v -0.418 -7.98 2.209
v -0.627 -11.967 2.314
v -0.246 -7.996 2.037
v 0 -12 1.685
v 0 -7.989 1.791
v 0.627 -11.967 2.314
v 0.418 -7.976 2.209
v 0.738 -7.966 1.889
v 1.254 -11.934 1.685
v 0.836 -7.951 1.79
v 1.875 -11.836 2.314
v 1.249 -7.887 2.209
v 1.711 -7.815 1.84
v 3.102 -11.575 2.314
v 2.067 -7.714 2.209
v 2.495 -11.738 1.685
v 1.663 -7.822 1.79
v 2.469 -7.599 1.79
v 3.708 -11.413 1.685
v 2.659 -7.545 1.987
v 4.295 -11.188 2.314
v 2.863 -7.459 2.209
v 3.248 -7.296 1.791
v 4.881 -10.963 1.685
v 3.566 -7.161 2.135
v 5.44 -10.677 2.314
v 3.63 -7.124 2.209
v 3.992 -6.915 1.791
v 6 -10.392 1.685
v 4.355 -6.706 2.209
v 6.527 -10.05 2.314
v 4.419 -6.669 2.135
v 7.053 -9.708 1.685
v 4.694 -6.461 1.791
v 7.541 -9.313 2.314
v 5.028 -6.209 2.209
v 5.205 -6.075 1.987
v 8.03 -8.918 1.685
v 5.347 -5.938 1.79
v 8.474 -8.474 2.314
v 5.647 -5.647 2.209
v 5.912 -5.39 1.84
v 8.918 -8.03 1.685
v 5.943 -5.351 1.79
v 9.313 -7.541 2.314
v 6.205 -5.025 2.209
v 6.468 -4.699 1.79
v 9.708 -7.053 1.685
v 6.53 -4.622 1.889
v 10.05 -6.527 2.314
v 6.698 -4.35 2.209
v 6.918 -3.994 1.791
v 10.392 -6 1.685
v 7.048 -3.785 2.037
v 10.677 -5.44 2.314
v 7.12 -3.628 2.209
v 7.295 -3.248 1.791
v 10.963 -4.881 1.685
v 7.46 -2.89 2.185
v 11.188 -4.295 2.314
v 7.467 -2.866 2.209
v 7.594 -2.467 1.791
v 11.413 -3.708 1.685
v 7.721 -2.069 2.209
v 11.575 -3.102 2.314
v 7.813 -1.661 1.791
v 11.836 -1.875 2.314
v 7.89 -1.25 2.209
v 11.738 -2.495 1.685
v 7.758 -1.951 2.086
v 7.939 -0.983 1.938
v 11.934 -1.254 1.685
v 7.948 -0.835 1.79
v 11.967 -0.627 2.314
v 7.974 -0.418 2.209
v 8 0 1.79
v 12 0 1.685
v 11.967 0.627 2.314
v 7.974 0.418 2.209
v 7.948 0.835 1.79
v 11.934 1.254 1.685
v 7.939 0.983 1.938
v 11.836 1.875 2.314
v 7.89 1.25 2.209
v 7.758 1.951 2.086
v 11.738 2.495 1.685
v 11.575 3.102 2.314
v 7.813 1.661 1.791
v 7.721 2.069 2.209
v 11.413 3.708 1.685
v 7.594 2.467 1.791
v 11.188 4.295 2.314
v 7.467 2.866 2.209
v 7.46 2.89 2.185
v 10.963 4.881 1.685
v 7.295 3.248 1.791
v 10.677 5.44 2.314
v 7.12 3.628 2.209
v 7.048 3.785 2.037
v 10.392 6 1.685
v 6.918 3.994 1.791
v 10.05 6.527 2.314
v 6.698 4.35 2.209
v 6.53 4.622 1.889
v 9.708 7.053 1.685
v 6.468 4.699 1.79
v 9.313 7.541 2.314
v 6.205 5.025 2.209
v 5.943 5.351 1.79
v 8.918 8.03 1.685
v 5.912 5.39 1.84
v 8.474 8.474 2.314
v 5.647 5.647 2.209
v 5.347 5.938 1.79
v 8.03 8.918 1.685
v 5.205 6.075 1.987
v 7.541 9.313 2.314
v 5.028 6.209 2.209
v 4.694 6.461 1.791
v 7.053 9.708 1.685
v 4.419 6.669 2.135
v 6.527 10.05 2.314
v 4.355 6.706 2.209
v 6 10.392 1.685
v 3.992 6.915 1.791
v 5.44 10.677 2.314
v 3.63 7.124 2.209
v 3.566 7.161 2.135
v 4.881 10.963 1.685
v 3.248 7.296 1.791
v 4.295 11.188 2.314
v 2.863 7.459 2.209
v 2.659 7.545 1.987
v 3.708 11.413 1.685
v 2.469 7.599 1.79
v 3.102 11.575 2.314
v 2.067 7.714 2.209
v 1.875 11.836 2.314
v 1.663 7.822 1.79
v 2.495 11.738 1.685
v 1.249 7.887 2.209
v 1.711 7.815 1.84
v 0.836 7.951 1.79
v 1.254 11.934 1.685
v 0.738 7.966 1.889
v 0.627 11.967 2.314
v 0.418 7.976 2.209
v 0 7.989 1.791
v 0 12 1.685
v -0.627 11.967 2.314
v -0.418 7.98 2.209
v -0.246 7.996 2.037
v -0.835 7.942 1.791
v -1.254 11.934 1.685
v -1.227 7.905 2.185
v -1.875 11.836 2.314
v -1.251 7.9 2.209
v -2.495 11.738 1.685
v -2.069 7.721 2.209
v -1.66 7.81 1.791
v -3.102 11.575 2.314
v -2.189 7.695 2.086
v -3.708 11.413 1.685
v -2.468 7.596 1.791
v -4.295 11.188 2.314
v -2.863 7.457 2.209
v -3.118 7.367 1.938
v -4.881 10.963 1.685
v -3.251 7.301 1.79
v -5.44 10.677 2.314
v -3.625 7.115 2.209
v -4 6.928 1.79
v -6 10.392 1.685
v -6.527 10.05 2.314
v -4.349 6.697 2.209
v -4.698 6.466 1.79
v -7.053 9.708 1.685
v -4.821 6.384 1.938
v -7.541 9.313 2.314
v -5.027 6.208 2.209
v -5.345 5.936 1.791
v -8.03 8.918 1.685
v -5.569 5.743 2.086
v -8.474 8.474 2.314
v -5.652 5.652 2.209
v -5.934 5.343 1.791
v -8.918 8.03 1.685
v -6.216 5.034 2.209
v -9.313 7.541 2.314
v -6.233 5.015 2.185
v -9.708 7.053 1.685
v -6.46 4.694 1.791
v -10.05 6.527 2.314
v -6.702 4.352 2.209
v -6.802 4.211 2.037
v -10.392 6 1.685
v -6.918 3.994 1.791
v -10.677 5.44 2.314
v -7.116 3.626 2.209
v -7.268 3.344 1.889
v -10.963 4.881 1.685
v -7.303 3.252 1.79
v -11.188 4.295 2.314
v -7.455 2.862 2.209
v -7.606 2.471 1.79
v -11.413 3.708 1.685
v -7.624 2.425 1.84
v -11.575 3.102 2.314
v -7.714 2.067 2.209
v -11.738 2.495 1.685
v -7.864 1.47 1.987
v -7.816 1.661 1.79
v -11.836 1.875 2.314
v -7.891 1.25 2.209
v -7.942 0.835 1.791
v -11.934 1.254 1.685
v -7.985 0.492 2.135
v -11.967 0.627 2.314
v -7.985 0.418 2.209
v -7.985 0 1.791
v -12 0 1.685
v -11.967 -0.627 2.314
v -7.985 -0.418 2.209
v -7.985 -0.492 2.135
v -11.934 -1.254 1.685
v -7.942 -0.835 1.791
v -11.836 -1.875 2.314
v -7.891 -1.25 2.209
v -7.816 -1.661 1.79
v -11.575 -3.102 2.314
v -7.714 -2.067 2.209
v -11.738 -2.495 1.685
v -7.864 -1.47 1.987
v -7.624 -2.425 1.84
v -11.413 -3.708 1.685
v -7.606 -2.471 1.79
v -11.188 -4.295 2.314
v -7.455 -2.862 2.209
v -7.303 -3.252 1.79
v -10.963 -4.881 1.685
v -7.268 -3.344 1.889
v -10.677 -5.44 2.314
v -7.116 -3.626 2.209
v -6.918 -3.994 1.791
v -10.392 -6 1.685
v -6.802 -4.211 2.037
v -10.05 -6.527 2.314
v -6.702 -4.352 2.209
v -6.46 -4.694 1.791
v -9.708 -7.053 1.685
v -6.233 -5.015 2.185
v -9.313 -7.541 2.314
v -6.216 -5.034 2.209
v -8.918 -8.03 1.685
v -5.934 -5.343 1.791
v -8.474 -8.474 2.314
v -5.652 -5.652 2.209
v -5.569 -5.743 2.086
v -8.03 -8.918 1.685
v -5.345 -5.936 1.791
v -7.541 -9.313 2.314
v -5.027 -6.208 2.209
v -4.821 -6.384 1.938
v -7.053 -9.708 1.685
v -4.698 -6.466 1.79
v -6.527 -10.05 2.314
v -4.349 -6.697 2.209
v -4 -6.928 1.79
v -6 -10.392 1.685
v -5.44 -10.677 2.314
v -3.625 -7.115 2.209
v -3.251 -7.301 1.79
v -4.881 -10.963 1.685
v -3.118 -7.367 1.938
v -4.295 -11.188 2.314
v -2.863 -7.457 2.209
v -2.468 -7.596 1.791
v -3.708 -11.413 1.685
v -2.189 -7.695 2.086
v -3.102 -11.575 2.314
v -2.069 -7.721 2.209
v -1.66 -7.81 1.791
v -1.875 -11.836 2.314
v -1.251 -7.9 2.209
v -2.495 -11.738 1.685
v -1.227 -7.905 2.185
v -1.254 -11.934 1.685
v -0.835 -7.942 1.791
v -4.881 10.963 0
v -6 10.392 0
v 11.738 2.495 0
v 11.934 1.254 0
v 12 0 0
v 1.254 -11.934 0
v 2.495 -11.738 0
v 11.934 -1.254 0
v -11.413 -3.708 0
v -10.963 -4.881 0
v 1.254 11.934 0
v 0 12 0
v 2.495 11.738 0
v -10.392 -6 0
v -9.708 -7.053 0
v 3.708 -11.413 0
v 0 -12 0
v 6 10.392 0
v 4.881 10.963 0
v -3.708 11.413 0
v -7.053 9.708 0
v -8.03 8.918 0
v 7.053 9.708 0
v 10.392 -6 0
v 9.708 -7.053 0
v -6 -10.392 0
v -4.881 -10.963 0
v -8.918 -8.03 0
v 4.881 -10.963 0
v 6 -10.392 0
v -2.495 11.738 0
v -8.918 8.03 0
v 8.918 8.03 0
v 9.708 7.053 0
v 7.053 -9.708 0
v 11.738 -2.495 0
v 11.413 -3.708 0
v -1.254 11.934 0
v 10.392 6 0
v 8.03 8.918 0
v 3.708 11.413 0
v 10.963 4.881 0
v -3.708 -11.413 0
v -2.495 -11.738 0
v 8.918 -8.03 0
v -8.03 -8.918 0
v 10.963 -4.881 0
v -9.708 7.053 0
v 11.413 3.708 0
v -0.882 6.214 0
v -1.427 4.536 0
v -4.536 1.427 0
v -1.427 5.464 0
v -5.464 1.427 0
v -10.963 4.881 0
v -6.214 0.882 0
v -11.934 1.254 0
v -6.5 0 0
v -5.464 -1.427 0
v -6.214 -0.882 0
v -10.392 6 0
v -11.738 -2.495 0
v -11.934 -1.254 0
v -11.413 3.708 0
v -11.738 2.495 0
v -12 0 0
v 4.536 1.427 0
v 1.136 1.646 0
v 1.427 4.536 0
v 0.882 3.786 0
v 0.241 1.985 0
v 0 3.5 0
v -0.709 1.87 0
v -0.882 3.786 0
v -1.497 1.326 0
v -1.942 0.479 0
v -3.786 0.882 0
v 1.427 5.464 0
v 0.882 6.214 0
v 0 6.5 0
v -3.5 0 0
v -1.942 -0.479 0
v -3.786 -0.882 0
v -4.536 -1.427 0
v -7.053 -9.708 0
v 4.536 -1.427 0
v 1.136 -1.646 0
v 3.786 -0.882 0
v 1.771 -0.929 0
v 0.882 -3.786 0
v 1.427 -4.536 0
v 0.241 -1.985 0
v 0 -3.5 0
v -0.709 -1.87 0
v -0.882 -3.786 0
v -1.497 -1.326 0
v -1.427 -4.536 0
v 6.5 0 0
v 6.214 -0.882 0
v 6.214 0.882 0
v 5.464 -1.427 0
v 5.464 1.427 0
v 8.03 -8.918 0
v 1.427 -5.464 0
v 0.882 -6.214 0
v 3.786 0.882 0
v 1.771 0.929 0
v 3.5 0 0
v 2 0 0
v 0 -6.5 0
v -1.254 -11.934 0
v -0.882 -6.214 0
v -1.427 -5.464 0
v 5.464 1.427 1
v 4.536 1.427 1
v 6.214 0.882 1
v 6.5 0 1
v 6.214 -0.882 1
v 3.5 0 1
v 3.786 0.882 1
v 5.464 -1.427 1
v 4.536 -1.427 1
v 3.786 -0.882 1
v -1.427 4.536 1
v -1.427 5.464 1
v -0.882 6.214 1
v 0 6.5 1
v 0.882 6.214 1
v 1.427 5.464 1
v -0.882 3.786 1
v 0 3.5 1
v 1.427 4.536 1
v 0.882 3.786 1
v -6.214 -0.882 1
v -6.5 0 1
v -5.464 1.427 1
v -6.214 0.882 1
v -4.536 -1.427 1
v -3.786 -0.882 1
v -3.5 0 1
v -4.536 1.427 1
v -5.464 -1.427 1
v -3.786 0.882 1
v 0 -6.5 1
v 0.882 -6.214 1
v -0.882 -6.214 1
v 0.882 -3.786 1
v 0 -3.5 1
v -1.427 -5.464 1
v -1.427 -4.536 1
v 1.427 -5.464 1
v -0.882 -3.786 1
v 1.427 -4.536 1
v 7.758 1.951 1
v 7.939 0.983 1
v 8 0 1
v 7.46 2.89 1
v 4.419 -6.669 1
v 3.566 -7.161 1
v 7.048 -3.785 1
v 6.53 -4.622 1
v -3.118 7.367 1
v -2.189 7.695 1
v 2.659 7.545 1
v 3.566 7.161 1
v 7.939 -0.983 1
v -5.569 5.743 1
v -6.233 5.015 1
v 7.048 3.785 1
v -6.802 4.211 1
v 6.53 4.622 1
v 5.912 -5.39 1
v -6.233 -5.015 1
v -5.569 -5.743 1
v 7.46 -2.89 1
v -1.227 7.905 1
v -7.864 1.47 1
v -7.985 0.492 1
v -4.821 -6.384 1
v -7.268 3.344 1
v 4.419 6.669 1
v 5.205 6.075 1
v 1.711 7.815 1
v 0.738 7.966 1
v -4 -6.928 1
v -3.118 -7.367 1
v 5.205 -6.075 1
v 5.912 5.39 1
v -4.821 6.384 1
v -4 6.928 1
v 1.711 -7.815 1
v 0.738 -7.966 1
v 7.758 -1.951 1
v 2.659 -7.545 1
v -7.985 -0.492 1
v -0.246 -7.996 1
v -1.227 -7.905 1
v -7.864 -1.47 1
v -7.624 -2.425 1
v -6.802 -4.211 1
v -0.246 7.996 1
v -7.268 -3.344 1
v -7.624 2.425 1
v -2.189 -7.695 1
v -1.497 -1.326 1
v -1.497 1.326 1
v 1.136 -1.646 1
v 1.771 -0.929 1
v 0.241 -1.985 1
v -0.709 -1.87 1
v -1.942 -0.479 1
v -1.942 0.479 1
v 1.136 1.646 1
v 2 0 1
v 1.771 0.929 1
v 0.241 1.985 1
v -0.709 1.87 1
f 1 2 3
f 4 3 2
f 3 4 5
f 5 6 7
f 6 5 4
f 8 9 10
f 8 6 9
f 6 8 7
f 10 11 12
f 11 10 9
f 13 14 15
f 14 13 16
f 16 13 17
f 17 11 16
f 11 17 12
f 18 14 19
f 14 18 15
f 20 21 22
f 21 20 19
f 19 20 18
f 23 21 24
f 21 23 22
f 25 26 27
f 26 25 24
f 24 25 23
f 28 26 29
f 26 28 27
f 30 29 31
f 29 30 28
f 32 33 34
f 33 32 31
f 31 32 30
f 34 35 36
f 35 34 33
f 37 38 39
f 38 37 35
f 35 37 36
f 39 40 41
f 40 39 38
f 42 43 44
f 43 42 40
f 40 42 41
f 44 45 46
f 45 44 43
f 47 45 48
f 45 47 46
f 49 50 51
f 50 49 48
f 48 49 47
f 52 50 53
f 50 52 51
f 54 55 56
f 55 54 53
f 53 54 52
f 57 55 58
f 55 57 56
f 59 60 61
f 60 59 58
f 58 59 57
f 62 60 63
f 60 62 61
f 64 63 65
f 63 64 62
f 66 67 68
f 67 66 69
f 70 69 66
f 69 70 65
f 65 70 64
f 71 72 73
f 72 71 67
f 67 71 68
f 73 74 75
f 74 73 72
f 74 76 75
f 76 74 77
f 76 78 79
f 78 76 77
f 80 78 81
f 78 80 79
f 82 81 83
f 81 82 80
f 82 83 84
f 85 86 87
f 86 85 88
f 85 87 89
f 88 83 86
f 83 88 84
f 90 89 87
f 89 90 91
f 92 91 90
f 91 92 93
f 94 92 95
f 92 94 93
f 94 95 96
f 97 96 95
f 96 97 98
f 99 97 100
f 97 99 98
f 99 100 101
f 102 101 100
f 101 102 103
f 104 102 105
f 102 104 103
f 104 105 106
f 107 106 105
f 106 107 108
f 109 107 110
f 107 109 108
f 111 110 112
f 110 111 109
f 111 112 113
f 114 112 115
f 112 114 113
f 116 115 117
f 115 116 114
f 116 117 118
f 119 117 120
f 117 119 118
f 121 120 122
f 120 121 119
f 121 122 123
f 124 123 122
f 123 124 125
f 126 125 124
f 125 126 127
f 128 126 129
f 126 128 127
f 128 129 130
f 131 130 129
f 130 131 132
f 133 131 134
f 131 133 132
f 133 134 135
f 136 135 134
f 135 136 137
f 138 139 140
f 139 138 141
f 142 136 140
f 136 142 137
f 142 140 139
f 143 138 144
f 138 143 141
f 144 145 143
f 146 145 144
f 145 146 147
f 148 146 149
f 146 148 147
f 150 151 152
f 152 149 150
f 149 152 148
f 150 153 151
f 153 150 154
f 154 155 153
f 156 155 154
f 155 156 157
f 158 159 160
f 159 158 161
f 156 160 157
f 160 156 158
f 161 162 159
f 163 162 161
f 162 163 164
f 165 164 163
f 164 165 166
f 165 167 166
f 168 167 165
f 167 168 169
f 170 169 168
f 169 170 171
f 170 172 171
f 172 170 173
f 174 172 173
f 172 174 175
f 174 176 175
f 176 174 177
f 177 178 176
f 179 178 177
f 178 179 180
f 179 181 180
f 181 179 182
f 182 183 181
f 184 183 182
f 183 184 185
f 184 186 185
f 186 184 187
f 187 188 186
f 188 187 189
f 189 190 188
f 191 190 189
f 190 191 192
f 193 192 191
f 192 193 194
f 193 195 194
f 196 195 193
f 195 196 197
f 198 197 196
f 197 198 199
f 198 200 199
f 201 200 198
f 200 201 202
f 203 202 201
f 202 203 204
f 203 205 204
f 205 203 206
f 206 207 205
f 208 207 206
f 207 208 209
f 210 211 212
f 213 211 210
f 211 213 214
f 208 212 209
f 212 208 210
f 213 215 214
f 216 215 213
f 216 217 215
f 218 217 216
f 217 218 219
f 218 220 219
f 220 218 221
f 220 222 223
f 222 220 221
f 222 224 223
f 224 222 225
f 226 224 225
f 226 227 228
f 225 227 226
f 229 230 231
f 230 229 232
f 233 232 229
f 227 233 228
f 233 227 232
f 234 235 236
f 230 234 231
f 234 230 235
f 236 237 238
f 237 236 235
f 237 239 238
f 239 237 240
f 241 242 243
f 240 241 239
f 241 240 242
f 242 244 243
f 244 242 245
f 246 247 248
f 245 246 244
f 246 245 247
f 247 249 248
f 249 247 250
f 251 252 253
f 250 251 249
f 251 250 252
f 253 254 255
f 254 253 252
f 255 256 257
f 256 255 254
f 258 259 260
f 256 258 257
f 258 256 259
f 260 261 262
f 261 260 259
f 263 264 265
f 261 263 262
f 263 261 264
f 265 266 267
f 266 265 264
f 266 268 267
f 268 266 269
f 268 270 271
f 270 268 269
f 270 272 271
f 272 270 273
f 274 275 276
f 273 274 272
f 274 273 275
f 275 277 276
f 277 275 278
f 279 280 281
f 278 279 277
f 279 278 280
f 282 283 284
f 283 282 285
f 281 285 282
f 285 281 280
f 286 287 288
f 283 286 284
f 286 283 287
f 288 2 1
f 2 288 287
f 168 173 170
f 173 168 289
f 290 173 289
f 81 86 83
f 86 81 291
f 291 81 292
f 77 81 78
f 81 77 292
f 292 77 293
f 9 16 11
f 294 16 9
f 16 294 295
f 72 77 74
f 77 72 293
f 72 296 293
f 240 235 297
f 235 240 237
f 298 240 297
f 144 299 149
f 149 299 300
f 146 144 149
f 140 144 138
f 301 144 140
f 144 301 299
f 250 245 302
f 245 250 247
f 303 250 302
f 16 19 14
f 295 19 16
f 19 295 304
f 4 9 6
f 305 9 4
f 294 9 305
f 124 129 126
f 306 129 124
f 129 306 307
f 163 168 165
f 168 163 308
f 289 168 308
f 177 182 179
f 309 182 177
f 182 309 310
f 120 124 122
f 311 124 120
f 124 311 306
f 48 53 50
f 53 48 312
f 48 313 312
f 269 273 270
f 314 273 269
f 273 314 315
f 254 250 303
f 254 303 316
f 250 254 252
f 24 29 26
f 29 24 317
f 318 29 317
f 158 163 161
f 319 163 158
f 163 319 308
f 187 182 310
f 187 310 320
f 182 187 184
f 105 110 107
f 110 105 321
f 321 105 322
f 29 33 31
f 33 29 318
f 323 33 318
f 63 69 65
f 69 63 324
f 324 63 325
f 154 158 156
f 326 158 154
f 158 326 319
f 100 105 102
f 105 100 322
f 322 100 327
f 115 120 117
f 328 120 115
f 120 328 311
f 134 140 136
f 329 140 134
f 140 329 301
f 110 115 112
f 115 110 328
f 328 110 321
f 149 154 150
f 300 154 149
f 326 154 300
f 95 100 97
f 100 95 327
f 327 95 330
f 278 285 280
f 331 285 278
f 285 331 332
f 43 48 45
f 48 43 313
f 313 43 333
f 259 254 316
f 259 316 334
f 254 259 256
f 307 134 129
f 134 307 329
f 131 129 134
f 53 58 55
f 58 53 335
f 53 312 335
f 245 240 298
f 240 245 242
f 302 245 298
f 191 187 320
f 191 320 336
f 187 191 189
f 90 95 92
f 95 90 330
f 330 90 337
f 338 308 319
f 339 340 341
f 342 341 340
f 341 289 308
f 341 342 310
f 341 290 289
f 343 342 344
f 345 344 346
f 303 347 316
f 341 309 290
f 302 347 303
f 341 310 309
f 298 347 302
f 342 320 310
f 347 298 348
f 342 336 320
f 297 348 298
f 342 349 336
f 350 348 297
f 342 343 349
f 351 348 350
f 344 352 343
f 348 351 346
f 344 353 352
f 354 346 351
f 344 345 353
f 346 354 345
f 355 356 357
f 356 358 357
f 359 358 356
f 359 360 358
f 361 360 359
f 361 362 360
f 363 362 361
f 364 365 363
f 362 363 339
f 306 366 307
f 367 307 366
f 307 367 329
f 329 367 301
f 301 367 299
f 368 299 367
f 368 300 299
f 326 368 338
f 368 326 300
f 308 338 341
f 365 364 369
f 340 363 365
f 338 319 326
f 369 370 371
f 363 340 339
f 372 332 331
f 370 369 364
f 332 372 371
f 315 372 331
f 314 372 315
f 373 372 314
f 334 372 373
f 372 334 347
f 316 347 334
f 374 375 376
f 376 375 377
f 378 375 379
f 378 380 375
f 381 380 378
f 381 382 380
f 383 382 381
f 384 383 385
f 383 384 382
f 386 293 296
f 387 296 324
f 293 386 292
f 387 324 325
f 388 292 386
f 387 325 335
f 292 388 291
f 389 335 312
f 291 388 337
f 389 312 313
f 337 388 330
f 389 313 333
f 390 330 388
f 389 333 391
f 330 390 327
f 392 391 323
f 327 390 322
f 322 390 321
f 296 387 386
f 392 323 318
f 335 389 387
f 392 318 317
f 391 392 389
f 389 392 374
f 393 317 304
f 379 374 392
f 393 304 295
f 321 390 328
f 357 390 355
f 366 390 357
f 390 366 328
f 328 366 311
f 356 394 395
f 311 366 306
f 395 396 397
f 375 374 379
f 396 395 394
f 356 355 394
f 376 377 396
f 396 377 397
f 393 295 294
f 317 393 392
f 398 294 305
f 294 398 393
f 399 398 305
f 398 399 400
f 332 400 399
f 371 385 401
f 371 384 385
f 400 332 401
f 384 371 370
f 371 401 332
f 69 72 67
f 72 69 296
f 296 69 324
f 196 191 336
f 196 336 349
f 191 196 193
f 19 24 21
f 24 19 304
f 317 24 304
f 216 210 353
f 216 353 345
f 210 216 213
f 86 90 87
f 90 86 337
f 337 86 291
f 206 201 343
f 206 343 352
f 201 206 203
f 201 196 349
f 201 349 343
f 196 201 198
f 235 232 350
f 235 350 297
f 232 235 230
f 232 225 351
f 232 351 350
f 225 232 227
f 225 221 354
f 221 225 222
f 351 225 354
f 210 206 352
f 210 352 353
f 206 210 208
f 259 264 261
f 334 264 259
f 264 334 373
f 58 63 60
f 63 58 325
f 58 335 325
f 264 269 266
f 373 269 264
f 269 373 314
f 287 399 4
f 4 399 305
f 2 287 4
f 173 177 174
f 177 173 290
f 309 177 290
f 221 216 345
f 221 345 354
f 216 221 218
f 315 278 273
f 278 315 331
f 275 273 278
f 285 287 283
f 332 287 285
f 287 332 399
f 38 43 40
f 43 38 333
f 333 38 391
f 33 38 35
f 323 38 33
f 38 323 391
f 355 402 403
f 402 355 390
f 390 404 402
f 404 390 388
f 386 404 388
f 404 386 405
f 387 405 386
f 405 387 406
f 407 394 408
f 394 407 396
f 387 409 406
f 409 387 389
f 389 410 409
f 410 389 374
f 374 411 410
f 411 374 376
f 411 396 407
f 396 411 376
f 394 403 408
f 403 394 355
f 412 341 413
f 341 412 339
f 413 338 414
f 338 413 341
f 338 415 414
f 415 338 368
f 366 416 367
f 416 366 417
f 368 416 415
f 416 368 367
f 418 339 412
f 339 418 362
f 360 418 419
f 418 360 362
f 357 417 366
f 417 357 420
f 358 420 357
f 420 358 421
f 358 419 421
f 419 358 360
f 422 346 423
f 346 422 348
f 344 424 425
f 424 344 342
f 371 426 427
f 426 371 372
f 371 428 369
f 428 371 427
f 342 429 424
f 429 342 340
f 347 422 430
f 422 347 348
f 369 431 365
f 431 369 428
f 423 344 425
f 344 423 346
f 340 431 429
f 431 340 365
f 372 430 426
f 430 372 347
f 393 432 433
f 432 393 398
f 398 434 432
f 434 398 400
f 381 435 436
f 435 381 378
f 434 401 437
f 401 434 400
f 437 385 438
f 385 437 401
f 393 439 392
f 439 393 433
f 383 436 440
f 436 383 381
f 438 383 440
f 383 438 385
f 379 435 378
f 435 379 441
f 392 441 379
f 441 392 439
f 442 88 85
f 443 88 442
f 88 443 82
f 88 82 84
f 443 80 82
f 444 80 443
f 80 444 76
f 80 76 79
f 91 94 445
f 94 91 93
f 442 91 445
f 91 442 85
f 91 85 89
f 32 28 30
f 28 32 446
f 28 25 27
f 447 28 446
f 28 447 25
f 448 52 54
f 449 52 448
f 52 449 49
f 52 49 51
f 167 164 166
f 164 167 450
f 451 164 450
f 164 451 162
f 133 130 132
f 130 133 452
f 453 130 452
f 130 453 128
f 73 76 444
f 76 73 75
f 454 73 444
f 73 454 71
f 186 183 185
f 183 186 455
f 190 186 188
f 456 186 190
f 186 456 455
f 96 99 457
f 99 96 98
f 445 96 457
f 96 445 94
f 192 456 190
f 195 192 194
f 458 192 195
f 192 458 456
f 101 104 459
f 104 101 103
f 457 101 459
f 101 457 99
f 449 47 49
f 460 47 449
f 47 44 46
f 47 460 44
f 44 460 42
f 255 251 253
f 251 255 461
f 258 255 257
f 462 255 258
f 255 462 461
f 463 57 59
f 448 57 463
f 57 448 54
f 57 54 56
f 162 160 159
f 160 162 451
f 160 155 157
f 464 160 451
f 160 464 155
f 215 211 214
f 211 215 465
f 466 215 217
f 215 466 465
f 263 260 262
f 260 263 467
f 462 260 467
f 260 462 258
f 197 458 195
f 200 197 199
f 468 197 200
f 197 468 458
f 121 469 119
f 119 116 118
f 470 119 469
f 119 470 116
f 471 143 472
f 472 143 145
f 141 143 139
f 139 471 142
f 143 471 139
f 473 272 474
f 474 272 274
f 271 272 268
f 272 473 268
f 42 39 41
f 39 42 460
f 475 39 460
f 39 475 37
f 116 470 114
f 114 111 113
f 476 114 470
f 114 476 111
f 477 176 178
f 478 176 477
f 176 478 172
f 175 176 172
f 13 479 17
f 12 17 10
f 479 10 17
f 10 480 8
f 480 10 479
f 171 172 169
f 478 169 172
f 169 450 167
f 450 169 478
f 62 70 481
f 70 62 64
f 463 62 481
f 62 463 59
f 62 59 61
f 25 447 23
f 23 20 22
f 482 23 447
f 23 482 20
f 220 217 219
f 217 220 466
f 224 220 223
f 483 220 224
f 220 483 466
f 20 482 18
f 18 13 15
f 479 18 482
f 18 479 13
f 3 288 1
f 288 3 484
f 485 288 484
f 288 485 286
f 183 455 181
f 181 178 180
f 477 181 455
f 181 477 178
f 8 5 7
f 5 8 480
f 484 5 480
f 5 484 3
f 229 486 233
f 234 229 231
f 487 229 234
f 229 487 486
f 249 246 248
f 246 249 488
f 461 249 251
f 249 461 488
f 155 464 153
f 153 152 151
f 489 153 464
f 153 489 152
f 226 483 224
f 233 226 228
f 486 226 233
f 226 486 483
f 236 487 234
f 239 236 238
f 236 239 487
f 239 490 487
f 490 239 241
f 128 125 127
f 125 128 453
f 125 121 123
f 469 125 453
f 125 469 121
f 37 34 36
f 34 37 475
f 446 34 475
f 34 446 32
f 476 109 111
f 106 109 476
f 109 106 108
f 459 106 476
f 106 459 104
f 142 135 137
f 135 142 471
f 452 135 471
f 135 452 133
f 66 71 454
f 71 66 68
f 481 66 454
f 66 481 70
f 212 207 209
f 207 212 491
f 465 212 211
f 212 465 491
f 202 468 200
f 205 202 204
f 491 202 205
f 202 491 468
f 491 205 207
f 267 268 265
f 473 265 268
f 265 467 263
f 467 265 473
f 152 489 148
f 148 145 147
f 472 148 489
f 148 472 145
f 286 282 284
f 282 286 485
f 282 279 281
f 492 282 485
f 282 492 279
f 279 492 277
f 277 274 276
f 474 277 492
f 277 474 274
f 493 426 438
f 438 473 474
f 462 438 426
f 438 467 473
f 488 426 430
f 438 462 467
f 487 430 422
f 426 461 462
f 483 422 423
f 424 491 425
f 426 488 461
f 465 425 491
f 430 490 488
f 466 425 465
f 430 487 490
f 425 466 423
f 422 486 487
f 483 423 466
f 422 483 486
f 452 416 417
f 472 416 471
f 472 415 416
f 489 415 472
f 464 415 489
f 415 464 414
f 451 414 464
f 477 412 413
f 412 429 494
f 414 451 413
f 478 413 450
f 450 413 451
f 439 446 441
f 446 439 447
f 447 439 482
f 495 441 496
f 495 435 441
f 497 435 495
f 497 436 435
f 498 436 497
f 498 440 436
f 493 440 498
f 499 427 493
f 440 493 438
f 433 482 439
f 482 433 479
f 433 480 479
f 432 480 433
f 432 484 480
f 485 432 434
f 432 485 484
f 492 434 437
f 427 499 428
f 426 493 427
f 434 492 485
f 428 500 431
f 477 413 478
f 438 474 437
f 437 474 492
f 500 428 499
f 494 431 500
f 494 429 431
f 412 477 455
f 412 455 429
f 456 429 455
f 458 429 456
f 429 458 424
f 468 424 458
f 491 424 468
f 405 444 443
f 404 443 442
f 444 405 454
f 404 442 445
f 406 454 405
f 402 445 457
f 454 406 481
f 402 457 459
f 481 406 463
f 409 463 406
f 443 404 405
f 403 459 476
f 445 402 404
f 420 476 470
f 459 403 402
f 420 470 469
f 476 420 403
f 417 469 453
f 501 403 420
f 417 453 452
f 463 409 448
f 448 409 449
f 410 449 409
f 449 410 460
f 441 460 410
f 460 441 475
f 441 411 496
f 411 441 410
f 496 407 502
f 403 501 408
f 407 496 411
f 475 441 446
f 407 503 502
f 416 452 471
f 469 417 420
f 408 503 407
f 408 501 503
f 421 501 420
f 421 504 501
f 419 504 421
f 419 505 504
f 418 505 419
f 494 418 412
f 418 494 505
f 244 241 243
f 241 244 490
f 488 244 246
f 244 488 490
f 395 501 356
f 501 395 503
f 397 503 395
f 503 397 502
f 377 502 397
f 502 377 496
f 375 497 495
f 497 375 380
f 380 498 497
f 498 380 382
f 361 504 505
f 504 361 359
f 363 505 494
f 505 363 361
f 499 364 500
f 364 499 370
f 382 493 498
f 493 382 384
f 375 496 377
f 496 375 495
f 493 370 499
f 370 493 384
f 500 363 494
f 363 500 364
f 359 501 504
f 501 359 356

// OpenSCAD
diameter=24;
depth=10;
n=60;
$fa=1;
$fs=1;
h=2;
//polyhedron(points=[[0,0,0],[-depth,diameter/2,-depth/2],[0,diameter/2,depth/2],[depth,diameter/2,-depth/2],[0,0,-depth]],faces=[[0,1,2],[2,1,3],[0,3,1],[0,2,3]]);
/*difference() {
  union() {
    for (a=[0:360/n:360-360/n]) rotate ([0,0,a]) polyhedron(points=[[0,0,0],[-depth,diameter/2,-depth/2],[0,diameter/2,depth/2],[depth,diameter/2,-depth/2],[0,0,-depth/2]],faces=[[0,1,2],[2,1,3],[0,2,3],[0,4,1],[0,3,4],[4,3,1]]);
    translate([0,0,-depth/2-h])cylinder(d=diameter,h=h,$fn=n);
  }
  translate([0,0,-depth/2-h])cylinder(d=4,h=h+diameter);
  for(a=[0:90:270]) rotate([0,0,a])translate([5,0,-depth/2-h])cylinder(d=3,h=h+diameter);
  translate([0,0,-depth/2-h/2])cylinder(d=16,h=h+diameter);
  
}*/
a=180/n;
r=diameter/2;
x=sqrt(2*((r*sin(a))^2)/(1-2*(sin(a))^2));
ang=atan(x/(sqrt(2)*r));
module hirth(n=60,d=24,h=2) {
  difference() {
    cylinder(d=diameter,h=h+x/sqrt(2),$fn=n);
    translate([0,0,h])for (a=[0:360/n:360-360/n]) rotate ([0,0,a]) rotate([90+ang/2,0,0])rotate([0,0,45])cube([2*x,2*x,r+x]);
  }
}
/*translate([0,0,-depth/2-h])cylinder(d=4,h=h+diameter);
    for(a=[0:90:270]) rotate([0,0,a])translate([5,0,-depth/2-h])cylinder(d=3,h=h+diameter);
    translate([0,0,-depth/2-h/2])cylinder(d=16,h=h+diameter);*/
difference() {
  hirth(n=n,d=diameter,h=h);
  translate([0,0,h/2])cylinder(d=16,h=h);
  for(a=[0:90:270]) rotate([0,0,a])translate([5,0,-0.01])cylinder(d=3,h=h);
  translate([0,0,-0.01])cylinder(d=4,h=h);
  }
